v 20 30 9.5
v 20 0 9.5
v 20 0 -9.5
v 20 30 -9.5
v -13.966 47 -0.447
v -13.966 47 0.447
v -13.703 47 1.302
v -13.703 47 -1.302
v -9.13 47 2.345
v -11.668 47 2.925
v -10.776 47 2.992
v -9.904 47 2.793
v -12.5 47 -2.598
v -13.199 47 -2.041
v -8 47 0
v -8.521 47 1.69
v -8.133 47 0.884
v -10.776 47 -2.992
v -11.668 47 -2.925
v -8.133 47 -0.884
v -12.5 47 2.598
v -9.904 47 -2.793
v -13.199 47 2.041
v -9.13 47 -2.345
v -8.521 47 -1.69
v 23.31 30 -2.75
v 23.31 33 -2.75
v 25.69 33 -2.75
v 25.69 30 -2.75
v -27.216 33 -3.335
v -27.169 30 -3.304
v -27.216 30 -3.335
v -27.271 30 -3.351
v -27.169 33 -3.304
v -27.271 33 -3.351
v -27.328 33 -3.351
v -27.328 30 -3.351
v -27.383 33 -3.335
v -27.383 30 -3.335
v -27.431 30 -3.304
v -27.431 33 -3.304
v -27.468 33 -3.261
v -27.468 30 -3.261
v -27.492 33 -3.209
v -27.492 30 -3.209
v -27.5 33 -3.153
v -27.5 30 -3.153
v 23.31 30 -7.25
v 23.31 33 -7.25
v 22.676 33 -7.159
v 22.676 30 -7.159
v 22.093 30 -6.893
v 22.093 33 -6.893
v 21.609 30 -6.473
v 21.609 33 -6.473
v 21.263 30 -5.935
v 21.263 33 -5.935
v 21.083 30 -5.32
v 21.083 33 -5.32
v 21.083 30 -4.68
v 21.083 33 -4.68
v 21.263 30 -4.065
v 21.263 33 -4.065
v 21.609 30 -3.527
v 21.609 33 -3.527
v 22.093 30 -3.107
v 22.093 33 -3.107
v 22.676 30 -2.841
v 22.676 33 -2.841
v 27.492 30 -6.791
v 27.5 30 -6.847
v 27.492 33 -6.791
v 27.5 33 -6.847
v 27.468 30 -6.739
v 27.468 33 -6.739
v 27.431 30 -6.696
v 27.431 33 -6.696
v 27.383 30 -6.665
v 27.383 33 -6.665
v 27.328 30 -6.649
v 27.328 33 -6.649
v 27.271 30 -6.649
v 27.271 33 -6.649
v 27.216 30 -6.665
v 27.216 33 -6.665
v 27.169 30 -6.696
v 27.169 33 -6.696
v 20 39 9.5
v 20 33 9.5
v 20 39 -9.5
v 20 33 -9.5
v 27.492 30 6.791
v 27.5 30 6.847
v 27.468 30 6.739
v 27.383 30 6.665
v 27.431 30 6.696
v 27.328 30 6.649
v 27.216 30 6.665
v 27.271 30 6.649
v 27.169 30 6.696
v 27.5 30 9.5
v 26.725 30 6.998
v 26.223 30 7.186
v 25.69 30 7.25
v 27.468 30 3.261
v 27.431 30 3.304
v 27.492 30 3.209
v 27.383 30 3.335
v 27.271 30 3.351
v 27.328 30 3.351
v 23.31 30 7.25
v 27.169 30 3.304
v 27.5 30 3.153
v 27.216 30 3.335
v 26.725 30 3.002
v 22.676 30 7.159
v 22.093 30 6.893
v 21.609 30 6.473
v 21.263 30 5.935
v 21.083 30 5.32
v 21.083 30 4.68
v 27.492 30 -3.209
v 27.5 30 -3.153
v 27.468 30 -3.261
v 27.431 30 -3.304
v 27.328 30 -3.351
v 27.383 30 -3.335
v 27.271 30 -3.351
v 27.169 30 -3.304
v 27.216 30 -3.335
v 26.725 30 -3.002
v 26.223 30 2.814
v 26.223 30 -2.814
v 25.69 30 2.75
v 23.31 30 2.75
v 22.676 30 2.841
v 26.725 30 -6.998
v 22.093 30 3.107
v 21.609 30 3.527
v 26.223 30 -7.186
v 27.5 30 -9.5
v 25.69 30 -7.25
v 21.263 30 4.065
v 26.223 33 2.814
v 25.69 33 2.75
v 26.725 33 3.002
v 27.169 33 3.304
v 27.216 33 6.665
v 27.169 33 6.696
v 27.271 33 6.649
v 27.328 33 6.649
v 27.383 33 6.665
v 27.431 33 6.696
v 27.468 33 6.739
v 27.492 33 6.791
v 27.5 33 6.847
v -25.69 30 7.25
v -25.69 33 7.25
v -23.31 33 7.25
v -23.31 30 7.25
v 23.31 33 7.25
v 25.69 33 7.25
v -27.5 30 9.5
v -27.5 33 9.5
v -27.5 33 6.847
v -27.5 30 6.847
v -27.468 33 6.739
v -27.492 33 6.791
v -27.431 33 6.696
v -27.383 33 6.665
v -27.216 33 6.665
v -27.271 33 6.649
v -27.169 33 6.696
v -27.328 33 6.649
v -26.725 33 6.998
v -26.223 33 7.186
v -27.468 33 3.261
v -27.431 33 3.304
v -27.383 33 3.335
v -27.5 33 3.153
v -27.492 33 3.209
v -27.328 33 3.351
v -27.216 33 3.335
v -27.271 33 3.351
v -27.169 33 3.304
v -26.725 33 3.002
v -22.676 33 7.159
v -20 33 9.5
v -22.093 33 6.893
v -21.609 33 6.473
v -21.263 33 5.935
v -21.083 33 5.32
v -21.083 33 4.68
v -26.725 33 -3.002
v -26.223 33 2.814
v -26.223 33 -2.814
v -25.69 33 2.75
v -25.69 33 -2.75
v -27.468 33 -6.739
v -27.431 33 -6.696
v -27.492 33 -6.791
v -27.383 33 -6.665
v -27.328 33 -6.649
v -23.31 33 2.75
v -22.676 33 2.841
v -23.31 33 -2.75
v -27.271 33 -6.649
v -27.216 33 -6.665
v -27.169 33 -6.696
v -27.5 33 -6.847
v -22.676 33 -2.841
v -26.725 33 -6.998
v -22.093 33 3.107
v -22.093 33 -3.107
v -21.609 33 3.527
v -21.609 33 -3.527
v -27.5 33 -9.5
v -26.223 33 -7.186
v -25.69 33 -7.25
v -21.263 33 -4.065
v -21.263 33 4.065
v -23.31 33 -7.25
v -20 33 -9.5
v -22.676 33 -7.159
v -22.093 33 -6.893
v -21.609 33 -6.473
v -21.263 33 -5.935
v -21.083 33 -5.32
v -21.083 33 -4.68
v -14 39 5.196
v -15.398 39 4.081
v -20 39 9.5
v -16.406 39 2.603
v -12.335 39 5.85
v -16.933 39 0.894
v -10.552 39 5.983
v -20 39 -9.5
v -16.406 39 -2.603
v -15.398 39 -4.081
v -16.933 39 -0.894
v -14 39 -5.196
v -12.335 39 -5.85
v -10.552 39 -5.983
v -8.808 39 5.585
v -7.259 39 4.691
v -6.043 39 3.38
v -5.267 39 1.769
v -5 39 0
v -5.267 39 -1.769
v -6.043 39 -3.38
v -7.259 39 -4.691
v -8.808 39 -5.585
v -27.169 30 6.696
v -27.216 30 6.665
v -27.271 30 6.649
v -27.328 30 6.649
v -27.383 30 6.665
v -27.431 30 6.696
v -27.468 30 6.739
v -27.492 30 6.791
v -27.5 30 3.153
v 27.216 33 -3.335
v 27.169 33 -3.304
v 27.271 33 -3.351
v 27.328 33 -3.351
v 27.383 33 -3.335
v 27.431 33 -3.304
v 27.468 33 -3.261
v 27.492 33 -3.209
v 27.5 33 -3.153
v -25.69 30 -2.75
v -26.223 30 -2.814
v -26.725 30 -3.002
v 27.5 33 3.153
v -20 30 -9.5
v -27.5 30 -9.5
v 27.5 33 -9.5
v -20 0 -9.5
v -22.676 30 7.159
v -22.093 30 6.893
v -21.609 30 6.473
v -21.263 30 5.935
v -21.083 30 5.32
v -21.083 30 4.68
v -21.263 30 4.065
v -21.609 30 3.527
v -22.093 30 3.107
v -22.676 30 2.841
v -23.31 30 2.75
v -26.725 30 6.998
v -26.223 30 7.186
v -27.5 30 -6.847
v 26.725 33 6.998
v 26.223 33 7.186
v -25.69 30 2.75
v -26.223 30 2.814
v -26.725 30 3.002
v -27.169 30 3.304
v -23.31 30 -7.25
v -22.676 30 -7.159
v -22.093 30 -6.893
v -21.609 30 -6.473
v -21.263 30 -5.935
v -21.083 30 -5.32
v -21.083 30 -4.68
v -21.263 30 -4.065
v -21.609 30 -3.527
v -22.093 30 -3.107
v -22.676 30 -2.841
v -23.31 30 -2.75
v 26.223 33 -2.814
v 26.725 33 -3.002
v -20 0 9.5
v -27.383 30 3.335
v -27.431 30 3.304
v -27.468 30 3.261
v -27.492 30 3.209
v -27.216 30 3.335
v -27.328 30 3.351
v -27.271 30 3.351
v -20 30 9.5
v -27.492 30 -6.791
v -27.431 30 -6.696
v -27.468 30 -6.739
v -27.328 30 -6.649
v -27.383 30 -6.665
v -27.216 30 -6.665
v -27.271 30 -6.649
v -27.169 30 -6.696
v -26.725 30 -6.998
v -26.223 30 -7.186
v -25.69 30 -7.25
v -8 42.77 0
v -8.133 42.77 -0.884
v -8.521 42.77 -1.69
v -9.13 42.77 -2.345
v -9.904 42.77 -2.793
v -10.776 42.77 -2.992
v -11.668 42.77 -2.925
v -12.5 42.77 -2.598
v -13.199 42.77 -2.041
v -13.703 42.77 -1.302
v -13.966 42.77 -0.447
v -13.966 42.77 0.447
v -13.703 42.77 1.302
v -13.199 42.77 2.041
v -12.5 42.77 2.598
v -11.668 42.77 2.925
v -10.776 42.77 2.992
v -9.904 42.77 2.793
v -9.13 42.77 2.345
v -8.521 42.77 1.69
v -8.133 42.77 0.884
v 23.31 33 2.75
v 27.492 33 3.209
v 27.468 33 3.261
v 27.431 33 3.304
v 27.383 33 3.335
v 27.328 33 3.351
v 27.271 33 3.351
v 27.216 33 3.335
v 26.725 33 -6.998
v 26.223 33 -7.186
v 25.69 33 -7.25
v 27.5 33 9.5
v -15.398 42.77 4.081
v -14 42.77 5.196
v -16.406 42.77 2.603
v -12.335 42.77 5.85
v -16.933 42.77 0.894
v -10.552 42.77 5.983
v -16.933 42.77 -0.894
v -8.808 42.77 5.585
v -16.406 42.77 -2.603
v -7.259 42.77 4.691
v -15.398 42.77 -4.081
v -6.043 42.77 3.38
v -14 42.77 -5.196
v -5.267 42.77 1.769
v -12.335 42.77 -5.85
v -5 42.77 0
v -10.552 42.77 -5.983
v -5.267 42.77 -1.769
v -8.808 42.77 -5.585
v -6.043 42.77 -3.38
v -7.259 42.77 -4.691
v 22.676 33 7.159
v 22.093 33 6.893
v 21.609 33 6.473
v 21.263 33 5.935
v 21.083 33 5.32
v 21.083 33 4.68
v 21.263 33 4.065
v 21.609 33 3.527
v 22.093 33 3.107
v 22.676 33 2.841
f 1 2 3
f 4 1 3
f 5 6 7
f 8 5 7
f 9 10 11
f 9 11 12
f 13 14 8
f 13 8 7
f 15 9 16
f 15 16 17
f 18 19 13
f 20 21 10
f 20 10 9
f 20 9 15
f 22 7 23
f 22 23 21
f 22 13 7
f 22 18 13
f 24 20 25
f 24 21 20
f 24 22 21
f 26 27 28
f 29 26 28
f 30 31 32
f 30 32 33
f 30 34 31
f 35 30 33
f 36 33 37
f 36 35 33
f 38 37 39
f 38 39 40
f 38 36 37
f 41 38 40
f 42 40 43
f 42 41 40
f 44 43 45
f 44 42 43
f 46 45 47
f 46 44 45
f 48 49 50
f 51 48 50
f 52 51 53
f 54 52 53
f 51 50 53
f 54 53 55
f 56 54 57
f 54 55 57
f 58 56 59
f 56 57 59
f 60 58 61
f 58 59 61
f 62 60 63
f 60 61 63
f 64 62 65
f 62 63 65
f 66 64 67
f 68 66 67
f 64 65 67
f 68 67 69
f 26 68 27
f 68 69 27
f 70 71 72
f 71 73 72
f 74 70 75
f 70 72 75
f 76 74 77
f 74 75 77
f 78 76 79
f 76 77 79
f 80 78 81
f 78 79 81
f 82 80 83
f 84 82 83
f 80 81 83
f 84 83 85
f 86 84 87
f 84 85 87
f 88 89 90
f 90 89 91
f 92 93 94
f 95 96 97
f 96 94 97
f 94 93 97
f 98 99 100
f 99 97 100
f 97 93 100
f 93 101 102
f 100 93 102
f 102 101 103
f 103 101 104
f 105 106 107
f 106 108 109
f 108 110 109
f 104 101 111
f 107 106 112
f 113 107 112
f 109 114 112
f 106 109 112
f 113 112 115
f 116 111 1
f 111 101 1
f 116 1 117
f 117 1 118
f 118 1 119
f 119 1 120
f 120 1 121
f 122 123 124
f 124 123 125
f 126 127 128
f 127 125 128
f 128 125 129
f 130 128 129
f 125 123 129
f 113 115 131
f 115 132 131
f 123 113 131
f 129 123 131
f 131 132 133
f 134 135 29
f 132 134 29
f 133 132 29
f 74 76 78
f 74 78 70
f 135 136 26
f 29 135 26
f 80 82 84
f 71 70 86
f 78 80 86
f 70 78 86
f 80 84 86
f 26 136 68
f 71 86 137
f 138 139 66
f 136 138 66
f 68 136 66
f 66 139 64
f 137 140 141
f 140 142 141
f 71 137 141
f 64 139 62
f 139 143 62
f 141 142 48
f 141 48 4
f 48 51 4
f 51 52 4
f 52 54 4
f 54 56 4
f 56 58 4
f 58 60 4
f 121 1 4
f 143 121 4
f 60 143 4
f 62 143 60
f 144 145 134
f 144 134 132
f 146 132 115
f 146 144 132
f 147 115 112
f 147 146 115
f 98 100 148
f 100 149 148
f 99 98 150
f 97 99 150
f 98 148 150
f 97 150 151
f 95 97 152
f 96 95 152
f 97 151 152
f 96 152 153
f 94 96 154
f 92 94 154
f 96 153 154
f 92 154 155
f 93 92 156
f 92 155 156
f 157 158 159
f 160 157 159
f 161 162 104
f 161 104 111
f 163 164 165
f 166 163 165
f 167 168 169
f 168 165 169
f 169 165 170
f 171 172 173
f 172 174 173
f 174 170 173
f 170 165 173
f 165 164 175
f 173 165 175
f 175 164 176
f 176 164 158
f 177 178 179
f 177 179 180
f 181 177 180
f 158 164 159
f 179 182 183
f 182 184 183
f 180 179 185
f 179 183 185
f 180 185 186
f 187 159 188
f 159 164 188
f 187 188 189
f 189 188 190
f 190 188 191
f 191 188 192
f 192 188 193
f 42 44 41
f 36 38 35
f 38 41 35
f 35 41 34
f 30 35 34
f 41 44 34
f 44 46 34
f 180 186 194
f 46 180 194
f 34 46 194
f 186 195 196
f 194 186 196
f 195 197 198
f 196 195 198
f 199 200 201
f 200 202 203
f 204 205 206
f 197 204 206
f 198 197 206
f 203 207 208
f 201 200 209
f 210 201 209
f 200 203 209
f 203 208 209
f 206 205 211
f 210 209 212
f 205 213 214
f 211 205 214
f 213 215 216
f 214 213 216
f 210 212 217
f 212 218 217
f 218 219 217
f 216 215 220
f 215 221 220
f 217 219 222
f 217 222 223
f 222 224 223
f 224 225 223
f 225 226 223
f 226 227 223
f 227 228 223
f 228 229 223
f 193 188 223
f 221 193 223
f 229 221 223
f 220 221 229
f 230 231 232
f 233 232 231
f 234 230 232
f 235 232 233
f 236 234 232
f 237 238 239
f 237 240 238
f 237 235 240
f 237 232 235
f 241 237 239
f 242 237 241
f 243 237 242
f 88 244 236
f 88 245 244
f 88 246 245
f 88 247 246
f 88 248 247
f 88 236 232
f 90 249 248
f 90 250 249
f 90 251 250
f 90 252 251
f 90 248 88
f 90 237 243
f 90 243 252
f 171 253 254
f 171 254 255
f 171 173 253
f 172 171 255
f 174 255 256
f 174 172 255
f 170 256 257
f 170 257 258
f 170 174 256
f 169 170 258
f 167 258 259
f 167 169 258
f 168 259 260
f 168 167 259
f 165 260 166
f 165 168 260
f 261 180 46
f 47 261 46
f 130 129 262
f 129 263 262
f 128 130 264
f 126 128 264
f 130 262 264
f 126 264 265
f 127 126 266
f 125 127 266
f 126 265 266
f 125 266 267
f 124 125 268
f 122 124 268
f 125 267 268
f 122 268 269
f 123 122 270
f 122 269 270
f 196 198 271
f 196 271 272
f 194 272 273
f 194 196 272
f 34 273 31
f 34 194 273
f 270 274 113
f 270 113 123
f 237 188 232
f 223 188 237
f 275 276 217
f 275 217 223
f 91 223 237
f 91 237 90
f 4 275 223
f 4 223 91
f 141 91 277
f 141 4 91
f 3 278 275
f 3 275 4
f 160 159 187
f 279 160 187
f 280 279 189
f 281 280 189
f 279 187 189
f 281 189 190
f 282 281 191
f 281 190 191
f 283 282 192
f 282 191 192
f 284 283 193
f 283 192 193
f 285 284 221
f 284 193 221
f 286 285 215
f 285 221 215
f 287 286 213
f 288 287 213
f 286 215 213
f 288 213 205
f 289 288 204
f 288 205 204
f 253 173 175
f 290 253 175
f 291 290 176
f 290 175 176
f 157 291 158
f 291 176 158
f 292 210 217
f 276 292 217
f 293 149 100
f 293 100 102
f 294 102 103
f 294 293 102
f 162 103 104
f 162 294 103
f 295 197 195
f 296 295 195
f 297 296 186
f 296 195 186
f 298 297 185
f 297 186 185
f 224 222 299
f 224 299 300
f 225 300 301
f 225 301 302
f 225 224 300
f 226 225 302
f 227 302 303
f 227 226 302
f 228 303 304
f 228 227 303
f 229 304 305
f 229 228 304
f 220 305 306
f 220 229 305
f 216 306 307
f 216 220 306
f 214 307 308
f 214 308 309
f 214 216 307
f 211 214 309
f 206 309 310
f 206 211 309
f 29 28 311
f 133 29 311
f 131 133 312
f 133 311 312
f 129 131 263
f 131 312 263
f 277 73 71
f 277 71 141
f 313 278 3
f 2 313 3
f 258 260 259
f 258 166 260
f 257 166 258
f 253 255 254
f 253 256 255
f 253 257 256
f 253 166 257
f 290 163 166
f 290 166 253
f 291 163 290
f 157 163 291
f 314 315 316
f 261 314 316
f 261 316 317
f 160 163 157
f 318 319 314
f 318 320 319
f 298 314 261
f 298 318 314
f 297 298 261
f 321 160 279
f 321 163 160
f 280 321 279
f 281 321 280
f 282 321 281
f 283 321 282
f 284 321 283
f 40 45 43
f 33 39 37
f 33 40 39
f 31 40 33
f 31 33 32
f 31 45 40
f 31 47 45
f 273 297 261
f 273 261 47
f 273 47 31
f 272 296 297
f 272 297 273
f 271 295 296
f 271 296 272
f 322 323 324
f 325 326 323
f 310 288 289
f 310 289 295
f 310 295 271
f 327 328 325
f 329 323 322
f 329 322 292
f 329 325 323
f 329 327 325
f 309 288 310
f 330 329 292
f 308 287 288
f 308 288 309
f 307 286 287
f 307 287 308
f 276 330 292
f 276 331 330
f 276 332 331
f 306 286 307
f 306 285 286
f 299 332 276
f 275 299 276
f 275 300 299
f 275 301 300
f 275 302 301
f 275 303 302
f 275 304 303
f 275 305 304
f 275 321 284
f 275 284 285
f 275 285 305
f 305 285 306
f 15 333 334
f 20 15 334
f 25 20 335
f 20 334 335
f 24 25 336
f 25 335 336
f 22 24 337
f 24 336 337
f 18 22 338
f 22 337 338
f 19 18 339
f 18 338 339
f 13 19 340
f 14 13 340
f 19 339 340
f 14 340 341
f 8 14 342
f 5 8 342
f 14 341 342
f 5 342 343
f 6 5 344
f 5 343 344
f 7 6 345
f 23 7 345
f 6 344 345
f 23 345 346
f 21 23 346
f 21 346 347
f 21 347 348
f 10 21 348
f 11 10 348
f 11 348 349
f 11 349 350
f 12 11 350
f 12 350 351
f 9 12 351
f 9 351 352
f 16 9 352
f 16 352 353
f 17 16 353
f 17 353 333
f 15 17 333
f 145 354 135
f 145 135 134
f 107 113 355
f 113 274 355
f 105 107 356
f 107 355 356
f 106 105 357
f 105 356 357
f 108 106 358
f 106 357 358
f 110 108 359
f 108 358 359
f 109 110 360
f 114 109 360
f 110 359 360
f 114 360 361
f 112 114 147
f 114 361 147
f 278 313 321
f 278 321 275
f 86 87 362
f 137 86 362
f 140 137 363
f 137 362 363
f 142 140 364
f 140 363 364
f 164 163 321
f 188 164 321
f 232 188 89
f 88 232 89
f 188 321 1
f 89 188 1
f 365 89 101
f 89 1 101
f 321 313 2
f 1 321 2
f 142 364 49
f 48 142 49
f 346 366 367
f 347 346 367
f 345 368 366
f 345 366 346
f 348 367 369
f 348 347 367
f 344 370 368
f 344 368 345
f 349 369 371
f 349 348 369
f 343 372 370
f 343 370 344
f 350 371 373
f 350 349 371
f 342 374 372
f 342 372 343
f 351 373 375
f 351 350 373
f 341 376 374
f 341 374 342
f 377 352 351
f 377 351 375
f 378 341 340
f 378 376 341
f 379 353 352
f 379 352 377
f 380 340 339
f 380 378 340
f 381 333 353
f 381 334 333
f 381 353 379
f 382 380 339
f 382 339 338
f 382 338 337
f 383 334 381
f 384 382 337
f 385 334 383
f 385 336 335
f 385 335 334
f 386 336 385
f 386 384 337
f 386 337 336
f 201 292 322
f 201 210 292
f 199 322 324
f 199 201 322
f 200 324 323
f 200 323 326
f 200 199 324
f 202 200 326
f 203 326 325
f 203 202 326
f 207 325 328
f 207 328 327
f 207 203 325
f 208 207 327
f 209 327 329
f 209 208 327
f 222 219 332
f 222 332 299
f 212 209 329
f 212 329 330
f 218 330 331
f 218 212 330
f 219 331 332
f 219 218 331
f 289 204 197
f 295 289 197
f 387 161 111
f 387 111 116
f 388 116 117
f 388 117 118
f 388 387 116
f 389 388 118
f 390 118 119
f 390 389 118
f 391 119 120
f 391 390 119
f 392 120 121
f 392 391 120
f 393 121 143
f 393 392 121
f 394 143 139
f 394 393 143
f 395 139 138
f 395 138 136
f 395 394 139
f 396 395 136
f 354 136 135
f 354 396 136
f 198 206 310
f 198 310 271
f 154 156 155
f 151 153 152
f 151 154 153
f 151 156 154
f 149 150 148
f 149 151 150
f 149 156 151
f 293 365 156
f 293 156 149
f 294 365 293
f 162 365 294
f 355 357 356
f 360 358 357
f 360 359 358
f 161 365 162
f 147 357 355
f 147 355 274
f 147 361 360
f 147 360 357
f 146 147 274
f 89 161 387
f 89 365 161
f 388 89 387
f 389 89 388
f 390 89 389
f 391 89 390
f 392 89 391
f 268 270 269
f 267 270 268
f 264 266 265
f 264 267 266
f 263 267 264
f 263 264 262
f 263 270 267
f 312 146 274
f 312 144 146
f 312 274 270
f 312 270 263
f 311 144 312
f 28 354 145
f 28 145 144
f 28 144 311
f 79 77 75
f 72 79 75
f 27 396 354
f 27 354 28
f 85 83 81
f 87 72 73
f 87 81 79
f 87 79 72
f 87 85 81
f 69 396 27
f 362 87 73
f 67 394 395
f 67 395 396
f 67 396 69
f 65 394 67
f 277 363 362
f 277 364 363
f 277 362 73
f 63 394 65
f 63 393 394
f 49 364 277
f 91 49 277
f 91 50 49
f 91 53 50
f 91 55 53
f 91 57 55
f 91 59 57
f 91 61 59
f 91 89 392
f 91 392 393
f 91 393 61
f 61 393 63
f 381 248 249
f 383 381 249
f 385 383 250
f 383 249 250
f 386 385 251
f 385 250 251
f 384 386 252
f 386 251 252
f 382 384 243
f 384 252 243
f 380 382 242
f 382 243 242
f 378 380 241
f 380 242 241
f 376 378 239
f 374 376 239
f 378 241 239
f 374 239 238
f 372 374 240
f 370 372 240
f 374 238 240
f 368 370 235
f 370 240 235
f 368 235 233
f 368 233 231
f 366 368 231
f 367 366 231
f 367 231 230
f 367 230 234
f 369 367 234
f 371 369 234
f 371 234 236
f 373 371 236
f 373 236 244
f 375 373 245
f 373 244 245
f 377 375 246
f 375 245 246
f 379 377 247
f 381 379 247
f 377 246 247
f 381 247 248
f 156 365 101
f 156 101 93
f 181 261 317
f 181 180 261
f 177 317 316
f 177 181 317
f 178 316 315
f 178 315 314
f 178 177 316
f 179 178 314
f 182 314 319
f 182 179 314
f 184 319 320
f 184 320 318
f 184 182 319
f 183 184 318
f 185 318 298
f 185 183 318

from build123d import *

# Parameters (mm, degrees)
SKETCH1_W                = 40
SKETCH1_H                = 19
BOSS_EXTRUDE1_DEPTH      = 39
SKETCH2_W                = 19
SKETCH2_H                = 3
BOSS_EXTRUDE2_DEPTH      = 7.5
BOSS_EXTRUDE2_DEPTH_BACK = 47.5
CUT_EXTRUDE1_DEPTH       = 3
FILLET1_R                = 0.2
SKETCH4_R                = 3
BOSS_EXTRUDE3_DEPTH      = 8
SKETCH6_R                = 6
BOSS_EXTRUDE4_DEPTH      = 3.77


with BuildPart() as part:
    # Sketch1 → Boss-Extrude1 (new body)
    with BuildSketch(Plane(origin=(0, 0, 0), x_dir=(1, 0, 0), z_dir=(0, 1, 0))):
        Rectangle(SKETCH1_W, SKETCH1_H)
    extrude(amount=BOSS_EXTRUDE1_DEPTH)

    # Sketch2 → Boss-Extrude2 (add, two sides)
    with BuildSketch(Plane(origin=(20, 0, 0), x_dir=(0, 0, -1), z_dir=(1, 0, 0))) as boss_extrude2_sk:
        with Locations((0, 31.5)):
            Rectangle(SKETCH2_W, SKETCH2_H)
    extrude(amount=BOSS_EXTRUDE2_DEPTH)
    extrude(boss_extrude2_sk.sketch, amount=-BOSS_EXTRUDE2_DEPTH_BACK)

    # Sketch3 → Cut-Extrude1 (cut)
    with BuildSketch(Plane(origin=(0, 33, 0), x_dir=(1, 0, 0), z_dir=(0, 1, 0))):
        with BuildLine():
            Line((-23.309672477, 2.75), (-25.690327523, 2.75))
            ThreePointArc((-25.690327523, 2.75), (-27.940327523, 5), (-25.690327523, 7.25))
            Line((-25.690327523, 7.25), (-23.309672477, 7.25))
            ThreePointArc((-23.309672477, 7.25), (-21.059672477, 5), (-23.309672477, 2.75))
        make_face()
        with BuildLine():
            Line((-23.309672477, -2.75), (-25.690327523, -2.75))
            ThreePointArc((-25.690327523, -2.75), (-27.940327523, -5), (-25.690327523, -7.25))
            Line((-25.690327523, -7.25), (-23.309672477, -7.25))
            ThreePointArc((-23.309672477, -7.25), (-21.059672477, -5), (-23.309672477, -2.75))
        make_face()
        with BuildLine():
            Line((23.309672477, -2.75), (25.690327523, -2.75))
            ThreePointArc((25.690327523, -2.75), (27.940327523, -5), (25.690327523, -7.25))
            Line((25.690327523, -7.25), (23.309672477, -7.25))
            ThreePointArc((23.309672477, -7.25), (21.059672477, -5), (23.309672477, -2.75))
        make_face()
        with BuildLine():
            Line((23.309672477, 2.75), (25.690327523, 2.75))
            ThreePointArc((25.690327523, 2.75), (27.940327523, 5), (25.690327523, 7.25))
            Line((25.690327523, 7.25), (23.309672477, 7.25))
            ThreePointArc((23.309672477, 7.25), (21.059672477, 5), (23.309672477, 2.75))
        make_face()
    extrude(amount=-CUT_EXTRUDE1_DEPTH, mode=Mode.SUBTRACT)

    # Fillet1
    fillet1_edges = [part.edges().sort_by_distance(p)[0] for p in [
        (27.5, 31.5, 6.337006181),
        (27.5, 31.5, 3.662993819),
        (27.5, 31.5, -3.662993819),
        (27.5, 31.5, -6.337006181),
        (-27.5, 31.5, 3.662993819),
        (-27.5, 31.5, 6.337006181),
        (-27.5, 31.5, -6.337006181),
        (-27.5, 31.5, -3.662993819),
    ]]
    fillet(fillet1_edges, radius=FILLET1_R)

    # Sketch4 → Boss-Extrude3 (add)
    with BuildSketch(Plane(origin=(0, 39, 0), x_dir=(1, 0, 0), z_dir=(0, 1, 0))):
        with Locations((-11, 0)):
            Circle(SKETCH4_R)
    extrude(amount=BOSS_EXTRUDE3_DEPTH)

    # Sketch6 → Boss-Extrude4 (add)
    with BuildSketch(Plane(origin=(0, 39, 0), x_dir=(1, 0, 0), z_dir=(0, 1, 0))):
        with Locations((-11, 0)):
            Circle(SKETCH6_R)
    extrude(amount=BOSS_EXTRUDE4_DEPTH)


solid = part.part
